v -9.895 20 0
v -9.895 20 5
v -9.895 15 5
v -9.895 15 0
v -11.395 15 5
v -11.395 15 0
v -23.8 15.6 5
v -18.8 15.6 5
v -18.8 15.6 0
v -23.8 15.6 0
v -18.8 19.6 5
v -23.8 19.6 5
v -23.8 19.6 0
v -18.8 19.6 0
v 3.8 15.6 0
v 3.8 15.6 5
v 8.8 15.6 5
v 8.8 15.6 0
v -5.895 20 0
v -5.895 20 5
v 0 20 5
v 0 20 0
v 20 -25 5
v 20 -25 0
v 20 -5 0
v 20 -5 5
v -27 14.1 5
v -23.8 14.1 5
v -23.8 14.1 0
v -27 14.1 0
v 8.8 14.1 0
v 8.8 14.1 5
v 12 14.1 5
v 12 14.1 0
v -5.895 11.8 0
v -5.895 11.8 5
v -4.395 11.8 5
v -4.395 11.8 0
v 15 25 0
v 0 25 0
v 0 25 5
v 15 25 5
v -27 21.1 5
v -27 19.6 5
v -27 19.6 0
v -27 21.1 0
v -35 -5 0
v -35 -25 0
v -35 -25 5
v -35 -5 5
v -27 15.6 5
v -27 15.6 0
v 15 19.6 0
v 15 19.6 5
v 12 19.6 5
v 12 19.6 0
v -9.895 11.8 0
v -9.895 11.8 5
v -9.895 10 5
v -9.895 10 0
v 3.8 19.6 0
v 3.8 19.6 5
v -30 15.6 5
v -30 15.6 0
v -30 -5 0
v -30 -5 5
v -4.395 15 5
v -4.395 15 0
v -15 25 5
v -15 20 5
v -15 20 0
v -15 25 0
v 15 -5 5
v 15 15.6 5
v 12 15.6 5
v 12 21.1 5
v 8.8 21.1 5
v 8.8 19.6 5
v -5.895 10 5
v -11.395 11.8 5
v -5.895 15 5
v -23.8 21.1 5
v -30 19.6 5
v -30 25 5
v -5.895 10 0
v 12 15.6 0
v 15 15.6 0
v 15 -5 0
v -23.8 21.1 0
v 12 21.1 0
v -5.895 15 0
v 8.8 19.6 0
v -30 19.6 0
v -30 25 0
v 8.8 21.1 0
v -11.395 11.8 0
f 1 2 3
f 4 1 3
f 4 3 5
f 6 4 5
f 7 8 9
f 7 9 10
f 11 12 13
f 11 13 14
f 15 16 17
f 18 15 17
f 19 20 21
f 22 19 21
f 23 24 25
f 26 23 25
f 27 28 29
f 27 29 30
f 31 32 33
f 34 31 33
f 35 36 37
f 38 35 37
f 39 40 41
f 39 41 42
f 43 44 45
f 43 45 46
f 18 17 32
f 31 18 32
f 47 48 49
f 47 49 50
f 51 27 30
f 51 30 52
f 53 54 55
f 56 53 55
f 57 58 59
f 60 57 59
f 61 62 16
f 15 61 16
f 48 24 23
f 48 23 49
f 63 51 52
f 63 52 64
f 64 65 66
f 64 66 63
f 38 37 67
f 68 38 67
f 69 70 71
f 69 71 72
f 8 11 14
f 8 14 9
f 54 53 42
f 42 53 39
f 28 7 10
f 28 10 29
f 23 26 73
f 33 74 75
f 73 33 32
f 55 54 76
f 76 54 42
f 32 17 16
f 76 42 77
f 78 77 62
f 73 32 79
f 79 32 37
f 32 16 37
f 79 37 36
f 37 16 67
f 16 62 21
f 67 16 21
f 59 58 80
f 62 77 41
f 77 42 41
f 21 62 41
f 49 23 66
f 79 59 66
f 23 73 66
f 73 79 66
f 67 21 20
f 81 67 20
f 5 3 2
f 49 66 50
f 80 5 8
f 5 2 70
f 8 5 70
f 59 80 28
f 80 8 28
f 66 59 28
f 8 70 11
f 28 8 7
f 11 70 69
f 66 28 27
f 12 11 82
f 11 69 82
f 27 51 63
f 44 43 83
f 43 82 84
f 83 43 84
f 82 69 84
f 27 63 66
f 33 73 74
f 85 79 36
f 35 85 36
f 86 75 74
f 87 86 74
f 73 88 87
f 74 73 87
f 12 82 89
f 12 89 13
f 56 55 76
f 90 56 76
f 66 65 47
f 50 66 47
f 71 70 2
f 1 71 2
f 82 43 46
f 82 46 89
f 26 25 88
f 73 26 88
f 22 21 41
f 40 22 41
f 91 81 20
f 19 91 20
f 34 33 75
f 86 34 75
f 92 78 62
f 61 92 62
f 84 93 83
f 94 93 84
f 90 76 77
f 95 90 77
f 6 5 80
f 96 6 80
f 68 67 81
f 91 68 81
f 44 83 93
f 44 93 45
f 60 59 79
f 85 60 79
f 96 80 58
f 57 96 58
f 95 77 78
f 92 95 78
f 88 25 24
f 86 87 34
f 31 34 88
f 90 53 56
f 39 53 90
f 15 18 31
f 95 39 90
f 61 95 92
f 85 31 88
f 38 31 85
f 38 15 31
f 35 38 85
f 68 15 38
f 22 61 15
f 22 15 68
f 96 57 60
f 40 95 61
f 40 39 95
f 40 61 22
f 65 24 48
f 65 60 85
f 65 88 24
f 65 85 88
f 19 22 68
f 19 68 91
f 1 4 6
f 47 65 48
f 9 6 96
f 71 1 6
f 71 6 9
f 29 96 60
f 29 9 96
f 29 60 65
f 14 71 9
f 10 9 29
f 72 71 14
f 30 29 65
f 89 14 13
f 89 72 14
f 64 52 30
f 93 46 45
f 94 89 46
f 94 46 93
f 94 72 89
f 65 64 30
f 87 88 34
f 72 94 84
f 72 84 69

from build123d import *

# Parameters (mm, degrees)
SKETCH1_W           = 45
SKETCH1_H           = 50
BOSS_EXTRUDE1_DEPTH = 5
CUT_EXTRUDE1_DEPTH  = 5
SKETCH6_W           = 5
SKETCH6_H           = 20
BOSS_EXTRUDE2_DEPTH = 5
SKETCH7_W           = 15
SKETCH7_H           = 5
CUT_EXTRUDE2_DEPTH  = 10
CUT_EXTRUDE3_DEPTH  = 5


with BuildPart() as part:
    # Sketch1 → Boss-Extrude1 (new body)
    with BuildSketch(Plane.XY):
        with Locations((-7.5, 0)):
            Rectangle(SKETCH1_W, SKETCH1_H)
    extrude(amount=BOSS_EXTRUDE1_DEPTH)

    # Sketch5 → Cut-Extrude1 (cut)
    with BuildSketch(Plane.XY.offset(5)):
        Polygon((-30, 15.6), (-30, 19.6), (-27, 19.6), (-27, 21.1), (-23.8, 21.1), (-23.8, 19.6), (-18.8, 19.6), (-18.8, 15.6), (-23.8, 15.6), (-23.8, 14.1), (-27, 14.1), (-27, 15.6), align=None)
        Polygon((15, 19.6), (12, 19.6), (12, 21.1), (8.8, 21.1), (8.8, 19.6), (3.8, 19.6), (3.8, 15.6), (8.8, 15.6), (8.8, 14.1), (12, 14.1), (12, 15.6), (15, 15.6), align=None)
    extrude(amount=-CUT_EXTRUDE1_DEPTH, mode=Mode.SUBTRACT)

    # Sketch6 → Boss-Extrude2 (add)
    with BuildSketch(Plane(origin=(0, 0, 0), x_dir=(-1, 0, 0), z_dir=(0, 0, -1))):
        with Locations((-17.5, -15)):
            Rectangle(SKETCH6_W, SKETCH6_H)
        with Locations((32.5, -15)):
            Rectangle(SKETCH6_W, SKETCH6_H)
    extrude(amount=-BOSS_EXTRUDE2_DEPTH)

    # Sketch7 → Cut-Extrude2 (cut)
    with BuildSketch(Plane.XY.offset(5)):
        with Locations((-7.5, 22.5)):
            Rectangle(SKETCH7_W, SKETCH7_H)
    extrude(amount=-CUT_EXTRUDE2_DEPTH, mode=Mode.SUBTRACT)

    # Sketch8 → Cut-Extrude3 (cut)
    with BuildSketch(Plane.XY.offset(5)):
        Polygon((-9.894748858, 20), (-9.894748858, 15), (-11.394748858, 15), (-11.394748858, 11.8), (-9.894748858, 11.8), (-9.894748858, 10), (-5.894748858, 10), (-5.894748858, 11.8), (-4.394748858, 11.8), (-4.394748858, 15), (-5.894748858, 15), (-5.894748858, 20), align=None)
    extrude(amount=-CUT_EXTRUDE3_DEPTH, mode=Mode.SUBTRACT)


solid = part.part
